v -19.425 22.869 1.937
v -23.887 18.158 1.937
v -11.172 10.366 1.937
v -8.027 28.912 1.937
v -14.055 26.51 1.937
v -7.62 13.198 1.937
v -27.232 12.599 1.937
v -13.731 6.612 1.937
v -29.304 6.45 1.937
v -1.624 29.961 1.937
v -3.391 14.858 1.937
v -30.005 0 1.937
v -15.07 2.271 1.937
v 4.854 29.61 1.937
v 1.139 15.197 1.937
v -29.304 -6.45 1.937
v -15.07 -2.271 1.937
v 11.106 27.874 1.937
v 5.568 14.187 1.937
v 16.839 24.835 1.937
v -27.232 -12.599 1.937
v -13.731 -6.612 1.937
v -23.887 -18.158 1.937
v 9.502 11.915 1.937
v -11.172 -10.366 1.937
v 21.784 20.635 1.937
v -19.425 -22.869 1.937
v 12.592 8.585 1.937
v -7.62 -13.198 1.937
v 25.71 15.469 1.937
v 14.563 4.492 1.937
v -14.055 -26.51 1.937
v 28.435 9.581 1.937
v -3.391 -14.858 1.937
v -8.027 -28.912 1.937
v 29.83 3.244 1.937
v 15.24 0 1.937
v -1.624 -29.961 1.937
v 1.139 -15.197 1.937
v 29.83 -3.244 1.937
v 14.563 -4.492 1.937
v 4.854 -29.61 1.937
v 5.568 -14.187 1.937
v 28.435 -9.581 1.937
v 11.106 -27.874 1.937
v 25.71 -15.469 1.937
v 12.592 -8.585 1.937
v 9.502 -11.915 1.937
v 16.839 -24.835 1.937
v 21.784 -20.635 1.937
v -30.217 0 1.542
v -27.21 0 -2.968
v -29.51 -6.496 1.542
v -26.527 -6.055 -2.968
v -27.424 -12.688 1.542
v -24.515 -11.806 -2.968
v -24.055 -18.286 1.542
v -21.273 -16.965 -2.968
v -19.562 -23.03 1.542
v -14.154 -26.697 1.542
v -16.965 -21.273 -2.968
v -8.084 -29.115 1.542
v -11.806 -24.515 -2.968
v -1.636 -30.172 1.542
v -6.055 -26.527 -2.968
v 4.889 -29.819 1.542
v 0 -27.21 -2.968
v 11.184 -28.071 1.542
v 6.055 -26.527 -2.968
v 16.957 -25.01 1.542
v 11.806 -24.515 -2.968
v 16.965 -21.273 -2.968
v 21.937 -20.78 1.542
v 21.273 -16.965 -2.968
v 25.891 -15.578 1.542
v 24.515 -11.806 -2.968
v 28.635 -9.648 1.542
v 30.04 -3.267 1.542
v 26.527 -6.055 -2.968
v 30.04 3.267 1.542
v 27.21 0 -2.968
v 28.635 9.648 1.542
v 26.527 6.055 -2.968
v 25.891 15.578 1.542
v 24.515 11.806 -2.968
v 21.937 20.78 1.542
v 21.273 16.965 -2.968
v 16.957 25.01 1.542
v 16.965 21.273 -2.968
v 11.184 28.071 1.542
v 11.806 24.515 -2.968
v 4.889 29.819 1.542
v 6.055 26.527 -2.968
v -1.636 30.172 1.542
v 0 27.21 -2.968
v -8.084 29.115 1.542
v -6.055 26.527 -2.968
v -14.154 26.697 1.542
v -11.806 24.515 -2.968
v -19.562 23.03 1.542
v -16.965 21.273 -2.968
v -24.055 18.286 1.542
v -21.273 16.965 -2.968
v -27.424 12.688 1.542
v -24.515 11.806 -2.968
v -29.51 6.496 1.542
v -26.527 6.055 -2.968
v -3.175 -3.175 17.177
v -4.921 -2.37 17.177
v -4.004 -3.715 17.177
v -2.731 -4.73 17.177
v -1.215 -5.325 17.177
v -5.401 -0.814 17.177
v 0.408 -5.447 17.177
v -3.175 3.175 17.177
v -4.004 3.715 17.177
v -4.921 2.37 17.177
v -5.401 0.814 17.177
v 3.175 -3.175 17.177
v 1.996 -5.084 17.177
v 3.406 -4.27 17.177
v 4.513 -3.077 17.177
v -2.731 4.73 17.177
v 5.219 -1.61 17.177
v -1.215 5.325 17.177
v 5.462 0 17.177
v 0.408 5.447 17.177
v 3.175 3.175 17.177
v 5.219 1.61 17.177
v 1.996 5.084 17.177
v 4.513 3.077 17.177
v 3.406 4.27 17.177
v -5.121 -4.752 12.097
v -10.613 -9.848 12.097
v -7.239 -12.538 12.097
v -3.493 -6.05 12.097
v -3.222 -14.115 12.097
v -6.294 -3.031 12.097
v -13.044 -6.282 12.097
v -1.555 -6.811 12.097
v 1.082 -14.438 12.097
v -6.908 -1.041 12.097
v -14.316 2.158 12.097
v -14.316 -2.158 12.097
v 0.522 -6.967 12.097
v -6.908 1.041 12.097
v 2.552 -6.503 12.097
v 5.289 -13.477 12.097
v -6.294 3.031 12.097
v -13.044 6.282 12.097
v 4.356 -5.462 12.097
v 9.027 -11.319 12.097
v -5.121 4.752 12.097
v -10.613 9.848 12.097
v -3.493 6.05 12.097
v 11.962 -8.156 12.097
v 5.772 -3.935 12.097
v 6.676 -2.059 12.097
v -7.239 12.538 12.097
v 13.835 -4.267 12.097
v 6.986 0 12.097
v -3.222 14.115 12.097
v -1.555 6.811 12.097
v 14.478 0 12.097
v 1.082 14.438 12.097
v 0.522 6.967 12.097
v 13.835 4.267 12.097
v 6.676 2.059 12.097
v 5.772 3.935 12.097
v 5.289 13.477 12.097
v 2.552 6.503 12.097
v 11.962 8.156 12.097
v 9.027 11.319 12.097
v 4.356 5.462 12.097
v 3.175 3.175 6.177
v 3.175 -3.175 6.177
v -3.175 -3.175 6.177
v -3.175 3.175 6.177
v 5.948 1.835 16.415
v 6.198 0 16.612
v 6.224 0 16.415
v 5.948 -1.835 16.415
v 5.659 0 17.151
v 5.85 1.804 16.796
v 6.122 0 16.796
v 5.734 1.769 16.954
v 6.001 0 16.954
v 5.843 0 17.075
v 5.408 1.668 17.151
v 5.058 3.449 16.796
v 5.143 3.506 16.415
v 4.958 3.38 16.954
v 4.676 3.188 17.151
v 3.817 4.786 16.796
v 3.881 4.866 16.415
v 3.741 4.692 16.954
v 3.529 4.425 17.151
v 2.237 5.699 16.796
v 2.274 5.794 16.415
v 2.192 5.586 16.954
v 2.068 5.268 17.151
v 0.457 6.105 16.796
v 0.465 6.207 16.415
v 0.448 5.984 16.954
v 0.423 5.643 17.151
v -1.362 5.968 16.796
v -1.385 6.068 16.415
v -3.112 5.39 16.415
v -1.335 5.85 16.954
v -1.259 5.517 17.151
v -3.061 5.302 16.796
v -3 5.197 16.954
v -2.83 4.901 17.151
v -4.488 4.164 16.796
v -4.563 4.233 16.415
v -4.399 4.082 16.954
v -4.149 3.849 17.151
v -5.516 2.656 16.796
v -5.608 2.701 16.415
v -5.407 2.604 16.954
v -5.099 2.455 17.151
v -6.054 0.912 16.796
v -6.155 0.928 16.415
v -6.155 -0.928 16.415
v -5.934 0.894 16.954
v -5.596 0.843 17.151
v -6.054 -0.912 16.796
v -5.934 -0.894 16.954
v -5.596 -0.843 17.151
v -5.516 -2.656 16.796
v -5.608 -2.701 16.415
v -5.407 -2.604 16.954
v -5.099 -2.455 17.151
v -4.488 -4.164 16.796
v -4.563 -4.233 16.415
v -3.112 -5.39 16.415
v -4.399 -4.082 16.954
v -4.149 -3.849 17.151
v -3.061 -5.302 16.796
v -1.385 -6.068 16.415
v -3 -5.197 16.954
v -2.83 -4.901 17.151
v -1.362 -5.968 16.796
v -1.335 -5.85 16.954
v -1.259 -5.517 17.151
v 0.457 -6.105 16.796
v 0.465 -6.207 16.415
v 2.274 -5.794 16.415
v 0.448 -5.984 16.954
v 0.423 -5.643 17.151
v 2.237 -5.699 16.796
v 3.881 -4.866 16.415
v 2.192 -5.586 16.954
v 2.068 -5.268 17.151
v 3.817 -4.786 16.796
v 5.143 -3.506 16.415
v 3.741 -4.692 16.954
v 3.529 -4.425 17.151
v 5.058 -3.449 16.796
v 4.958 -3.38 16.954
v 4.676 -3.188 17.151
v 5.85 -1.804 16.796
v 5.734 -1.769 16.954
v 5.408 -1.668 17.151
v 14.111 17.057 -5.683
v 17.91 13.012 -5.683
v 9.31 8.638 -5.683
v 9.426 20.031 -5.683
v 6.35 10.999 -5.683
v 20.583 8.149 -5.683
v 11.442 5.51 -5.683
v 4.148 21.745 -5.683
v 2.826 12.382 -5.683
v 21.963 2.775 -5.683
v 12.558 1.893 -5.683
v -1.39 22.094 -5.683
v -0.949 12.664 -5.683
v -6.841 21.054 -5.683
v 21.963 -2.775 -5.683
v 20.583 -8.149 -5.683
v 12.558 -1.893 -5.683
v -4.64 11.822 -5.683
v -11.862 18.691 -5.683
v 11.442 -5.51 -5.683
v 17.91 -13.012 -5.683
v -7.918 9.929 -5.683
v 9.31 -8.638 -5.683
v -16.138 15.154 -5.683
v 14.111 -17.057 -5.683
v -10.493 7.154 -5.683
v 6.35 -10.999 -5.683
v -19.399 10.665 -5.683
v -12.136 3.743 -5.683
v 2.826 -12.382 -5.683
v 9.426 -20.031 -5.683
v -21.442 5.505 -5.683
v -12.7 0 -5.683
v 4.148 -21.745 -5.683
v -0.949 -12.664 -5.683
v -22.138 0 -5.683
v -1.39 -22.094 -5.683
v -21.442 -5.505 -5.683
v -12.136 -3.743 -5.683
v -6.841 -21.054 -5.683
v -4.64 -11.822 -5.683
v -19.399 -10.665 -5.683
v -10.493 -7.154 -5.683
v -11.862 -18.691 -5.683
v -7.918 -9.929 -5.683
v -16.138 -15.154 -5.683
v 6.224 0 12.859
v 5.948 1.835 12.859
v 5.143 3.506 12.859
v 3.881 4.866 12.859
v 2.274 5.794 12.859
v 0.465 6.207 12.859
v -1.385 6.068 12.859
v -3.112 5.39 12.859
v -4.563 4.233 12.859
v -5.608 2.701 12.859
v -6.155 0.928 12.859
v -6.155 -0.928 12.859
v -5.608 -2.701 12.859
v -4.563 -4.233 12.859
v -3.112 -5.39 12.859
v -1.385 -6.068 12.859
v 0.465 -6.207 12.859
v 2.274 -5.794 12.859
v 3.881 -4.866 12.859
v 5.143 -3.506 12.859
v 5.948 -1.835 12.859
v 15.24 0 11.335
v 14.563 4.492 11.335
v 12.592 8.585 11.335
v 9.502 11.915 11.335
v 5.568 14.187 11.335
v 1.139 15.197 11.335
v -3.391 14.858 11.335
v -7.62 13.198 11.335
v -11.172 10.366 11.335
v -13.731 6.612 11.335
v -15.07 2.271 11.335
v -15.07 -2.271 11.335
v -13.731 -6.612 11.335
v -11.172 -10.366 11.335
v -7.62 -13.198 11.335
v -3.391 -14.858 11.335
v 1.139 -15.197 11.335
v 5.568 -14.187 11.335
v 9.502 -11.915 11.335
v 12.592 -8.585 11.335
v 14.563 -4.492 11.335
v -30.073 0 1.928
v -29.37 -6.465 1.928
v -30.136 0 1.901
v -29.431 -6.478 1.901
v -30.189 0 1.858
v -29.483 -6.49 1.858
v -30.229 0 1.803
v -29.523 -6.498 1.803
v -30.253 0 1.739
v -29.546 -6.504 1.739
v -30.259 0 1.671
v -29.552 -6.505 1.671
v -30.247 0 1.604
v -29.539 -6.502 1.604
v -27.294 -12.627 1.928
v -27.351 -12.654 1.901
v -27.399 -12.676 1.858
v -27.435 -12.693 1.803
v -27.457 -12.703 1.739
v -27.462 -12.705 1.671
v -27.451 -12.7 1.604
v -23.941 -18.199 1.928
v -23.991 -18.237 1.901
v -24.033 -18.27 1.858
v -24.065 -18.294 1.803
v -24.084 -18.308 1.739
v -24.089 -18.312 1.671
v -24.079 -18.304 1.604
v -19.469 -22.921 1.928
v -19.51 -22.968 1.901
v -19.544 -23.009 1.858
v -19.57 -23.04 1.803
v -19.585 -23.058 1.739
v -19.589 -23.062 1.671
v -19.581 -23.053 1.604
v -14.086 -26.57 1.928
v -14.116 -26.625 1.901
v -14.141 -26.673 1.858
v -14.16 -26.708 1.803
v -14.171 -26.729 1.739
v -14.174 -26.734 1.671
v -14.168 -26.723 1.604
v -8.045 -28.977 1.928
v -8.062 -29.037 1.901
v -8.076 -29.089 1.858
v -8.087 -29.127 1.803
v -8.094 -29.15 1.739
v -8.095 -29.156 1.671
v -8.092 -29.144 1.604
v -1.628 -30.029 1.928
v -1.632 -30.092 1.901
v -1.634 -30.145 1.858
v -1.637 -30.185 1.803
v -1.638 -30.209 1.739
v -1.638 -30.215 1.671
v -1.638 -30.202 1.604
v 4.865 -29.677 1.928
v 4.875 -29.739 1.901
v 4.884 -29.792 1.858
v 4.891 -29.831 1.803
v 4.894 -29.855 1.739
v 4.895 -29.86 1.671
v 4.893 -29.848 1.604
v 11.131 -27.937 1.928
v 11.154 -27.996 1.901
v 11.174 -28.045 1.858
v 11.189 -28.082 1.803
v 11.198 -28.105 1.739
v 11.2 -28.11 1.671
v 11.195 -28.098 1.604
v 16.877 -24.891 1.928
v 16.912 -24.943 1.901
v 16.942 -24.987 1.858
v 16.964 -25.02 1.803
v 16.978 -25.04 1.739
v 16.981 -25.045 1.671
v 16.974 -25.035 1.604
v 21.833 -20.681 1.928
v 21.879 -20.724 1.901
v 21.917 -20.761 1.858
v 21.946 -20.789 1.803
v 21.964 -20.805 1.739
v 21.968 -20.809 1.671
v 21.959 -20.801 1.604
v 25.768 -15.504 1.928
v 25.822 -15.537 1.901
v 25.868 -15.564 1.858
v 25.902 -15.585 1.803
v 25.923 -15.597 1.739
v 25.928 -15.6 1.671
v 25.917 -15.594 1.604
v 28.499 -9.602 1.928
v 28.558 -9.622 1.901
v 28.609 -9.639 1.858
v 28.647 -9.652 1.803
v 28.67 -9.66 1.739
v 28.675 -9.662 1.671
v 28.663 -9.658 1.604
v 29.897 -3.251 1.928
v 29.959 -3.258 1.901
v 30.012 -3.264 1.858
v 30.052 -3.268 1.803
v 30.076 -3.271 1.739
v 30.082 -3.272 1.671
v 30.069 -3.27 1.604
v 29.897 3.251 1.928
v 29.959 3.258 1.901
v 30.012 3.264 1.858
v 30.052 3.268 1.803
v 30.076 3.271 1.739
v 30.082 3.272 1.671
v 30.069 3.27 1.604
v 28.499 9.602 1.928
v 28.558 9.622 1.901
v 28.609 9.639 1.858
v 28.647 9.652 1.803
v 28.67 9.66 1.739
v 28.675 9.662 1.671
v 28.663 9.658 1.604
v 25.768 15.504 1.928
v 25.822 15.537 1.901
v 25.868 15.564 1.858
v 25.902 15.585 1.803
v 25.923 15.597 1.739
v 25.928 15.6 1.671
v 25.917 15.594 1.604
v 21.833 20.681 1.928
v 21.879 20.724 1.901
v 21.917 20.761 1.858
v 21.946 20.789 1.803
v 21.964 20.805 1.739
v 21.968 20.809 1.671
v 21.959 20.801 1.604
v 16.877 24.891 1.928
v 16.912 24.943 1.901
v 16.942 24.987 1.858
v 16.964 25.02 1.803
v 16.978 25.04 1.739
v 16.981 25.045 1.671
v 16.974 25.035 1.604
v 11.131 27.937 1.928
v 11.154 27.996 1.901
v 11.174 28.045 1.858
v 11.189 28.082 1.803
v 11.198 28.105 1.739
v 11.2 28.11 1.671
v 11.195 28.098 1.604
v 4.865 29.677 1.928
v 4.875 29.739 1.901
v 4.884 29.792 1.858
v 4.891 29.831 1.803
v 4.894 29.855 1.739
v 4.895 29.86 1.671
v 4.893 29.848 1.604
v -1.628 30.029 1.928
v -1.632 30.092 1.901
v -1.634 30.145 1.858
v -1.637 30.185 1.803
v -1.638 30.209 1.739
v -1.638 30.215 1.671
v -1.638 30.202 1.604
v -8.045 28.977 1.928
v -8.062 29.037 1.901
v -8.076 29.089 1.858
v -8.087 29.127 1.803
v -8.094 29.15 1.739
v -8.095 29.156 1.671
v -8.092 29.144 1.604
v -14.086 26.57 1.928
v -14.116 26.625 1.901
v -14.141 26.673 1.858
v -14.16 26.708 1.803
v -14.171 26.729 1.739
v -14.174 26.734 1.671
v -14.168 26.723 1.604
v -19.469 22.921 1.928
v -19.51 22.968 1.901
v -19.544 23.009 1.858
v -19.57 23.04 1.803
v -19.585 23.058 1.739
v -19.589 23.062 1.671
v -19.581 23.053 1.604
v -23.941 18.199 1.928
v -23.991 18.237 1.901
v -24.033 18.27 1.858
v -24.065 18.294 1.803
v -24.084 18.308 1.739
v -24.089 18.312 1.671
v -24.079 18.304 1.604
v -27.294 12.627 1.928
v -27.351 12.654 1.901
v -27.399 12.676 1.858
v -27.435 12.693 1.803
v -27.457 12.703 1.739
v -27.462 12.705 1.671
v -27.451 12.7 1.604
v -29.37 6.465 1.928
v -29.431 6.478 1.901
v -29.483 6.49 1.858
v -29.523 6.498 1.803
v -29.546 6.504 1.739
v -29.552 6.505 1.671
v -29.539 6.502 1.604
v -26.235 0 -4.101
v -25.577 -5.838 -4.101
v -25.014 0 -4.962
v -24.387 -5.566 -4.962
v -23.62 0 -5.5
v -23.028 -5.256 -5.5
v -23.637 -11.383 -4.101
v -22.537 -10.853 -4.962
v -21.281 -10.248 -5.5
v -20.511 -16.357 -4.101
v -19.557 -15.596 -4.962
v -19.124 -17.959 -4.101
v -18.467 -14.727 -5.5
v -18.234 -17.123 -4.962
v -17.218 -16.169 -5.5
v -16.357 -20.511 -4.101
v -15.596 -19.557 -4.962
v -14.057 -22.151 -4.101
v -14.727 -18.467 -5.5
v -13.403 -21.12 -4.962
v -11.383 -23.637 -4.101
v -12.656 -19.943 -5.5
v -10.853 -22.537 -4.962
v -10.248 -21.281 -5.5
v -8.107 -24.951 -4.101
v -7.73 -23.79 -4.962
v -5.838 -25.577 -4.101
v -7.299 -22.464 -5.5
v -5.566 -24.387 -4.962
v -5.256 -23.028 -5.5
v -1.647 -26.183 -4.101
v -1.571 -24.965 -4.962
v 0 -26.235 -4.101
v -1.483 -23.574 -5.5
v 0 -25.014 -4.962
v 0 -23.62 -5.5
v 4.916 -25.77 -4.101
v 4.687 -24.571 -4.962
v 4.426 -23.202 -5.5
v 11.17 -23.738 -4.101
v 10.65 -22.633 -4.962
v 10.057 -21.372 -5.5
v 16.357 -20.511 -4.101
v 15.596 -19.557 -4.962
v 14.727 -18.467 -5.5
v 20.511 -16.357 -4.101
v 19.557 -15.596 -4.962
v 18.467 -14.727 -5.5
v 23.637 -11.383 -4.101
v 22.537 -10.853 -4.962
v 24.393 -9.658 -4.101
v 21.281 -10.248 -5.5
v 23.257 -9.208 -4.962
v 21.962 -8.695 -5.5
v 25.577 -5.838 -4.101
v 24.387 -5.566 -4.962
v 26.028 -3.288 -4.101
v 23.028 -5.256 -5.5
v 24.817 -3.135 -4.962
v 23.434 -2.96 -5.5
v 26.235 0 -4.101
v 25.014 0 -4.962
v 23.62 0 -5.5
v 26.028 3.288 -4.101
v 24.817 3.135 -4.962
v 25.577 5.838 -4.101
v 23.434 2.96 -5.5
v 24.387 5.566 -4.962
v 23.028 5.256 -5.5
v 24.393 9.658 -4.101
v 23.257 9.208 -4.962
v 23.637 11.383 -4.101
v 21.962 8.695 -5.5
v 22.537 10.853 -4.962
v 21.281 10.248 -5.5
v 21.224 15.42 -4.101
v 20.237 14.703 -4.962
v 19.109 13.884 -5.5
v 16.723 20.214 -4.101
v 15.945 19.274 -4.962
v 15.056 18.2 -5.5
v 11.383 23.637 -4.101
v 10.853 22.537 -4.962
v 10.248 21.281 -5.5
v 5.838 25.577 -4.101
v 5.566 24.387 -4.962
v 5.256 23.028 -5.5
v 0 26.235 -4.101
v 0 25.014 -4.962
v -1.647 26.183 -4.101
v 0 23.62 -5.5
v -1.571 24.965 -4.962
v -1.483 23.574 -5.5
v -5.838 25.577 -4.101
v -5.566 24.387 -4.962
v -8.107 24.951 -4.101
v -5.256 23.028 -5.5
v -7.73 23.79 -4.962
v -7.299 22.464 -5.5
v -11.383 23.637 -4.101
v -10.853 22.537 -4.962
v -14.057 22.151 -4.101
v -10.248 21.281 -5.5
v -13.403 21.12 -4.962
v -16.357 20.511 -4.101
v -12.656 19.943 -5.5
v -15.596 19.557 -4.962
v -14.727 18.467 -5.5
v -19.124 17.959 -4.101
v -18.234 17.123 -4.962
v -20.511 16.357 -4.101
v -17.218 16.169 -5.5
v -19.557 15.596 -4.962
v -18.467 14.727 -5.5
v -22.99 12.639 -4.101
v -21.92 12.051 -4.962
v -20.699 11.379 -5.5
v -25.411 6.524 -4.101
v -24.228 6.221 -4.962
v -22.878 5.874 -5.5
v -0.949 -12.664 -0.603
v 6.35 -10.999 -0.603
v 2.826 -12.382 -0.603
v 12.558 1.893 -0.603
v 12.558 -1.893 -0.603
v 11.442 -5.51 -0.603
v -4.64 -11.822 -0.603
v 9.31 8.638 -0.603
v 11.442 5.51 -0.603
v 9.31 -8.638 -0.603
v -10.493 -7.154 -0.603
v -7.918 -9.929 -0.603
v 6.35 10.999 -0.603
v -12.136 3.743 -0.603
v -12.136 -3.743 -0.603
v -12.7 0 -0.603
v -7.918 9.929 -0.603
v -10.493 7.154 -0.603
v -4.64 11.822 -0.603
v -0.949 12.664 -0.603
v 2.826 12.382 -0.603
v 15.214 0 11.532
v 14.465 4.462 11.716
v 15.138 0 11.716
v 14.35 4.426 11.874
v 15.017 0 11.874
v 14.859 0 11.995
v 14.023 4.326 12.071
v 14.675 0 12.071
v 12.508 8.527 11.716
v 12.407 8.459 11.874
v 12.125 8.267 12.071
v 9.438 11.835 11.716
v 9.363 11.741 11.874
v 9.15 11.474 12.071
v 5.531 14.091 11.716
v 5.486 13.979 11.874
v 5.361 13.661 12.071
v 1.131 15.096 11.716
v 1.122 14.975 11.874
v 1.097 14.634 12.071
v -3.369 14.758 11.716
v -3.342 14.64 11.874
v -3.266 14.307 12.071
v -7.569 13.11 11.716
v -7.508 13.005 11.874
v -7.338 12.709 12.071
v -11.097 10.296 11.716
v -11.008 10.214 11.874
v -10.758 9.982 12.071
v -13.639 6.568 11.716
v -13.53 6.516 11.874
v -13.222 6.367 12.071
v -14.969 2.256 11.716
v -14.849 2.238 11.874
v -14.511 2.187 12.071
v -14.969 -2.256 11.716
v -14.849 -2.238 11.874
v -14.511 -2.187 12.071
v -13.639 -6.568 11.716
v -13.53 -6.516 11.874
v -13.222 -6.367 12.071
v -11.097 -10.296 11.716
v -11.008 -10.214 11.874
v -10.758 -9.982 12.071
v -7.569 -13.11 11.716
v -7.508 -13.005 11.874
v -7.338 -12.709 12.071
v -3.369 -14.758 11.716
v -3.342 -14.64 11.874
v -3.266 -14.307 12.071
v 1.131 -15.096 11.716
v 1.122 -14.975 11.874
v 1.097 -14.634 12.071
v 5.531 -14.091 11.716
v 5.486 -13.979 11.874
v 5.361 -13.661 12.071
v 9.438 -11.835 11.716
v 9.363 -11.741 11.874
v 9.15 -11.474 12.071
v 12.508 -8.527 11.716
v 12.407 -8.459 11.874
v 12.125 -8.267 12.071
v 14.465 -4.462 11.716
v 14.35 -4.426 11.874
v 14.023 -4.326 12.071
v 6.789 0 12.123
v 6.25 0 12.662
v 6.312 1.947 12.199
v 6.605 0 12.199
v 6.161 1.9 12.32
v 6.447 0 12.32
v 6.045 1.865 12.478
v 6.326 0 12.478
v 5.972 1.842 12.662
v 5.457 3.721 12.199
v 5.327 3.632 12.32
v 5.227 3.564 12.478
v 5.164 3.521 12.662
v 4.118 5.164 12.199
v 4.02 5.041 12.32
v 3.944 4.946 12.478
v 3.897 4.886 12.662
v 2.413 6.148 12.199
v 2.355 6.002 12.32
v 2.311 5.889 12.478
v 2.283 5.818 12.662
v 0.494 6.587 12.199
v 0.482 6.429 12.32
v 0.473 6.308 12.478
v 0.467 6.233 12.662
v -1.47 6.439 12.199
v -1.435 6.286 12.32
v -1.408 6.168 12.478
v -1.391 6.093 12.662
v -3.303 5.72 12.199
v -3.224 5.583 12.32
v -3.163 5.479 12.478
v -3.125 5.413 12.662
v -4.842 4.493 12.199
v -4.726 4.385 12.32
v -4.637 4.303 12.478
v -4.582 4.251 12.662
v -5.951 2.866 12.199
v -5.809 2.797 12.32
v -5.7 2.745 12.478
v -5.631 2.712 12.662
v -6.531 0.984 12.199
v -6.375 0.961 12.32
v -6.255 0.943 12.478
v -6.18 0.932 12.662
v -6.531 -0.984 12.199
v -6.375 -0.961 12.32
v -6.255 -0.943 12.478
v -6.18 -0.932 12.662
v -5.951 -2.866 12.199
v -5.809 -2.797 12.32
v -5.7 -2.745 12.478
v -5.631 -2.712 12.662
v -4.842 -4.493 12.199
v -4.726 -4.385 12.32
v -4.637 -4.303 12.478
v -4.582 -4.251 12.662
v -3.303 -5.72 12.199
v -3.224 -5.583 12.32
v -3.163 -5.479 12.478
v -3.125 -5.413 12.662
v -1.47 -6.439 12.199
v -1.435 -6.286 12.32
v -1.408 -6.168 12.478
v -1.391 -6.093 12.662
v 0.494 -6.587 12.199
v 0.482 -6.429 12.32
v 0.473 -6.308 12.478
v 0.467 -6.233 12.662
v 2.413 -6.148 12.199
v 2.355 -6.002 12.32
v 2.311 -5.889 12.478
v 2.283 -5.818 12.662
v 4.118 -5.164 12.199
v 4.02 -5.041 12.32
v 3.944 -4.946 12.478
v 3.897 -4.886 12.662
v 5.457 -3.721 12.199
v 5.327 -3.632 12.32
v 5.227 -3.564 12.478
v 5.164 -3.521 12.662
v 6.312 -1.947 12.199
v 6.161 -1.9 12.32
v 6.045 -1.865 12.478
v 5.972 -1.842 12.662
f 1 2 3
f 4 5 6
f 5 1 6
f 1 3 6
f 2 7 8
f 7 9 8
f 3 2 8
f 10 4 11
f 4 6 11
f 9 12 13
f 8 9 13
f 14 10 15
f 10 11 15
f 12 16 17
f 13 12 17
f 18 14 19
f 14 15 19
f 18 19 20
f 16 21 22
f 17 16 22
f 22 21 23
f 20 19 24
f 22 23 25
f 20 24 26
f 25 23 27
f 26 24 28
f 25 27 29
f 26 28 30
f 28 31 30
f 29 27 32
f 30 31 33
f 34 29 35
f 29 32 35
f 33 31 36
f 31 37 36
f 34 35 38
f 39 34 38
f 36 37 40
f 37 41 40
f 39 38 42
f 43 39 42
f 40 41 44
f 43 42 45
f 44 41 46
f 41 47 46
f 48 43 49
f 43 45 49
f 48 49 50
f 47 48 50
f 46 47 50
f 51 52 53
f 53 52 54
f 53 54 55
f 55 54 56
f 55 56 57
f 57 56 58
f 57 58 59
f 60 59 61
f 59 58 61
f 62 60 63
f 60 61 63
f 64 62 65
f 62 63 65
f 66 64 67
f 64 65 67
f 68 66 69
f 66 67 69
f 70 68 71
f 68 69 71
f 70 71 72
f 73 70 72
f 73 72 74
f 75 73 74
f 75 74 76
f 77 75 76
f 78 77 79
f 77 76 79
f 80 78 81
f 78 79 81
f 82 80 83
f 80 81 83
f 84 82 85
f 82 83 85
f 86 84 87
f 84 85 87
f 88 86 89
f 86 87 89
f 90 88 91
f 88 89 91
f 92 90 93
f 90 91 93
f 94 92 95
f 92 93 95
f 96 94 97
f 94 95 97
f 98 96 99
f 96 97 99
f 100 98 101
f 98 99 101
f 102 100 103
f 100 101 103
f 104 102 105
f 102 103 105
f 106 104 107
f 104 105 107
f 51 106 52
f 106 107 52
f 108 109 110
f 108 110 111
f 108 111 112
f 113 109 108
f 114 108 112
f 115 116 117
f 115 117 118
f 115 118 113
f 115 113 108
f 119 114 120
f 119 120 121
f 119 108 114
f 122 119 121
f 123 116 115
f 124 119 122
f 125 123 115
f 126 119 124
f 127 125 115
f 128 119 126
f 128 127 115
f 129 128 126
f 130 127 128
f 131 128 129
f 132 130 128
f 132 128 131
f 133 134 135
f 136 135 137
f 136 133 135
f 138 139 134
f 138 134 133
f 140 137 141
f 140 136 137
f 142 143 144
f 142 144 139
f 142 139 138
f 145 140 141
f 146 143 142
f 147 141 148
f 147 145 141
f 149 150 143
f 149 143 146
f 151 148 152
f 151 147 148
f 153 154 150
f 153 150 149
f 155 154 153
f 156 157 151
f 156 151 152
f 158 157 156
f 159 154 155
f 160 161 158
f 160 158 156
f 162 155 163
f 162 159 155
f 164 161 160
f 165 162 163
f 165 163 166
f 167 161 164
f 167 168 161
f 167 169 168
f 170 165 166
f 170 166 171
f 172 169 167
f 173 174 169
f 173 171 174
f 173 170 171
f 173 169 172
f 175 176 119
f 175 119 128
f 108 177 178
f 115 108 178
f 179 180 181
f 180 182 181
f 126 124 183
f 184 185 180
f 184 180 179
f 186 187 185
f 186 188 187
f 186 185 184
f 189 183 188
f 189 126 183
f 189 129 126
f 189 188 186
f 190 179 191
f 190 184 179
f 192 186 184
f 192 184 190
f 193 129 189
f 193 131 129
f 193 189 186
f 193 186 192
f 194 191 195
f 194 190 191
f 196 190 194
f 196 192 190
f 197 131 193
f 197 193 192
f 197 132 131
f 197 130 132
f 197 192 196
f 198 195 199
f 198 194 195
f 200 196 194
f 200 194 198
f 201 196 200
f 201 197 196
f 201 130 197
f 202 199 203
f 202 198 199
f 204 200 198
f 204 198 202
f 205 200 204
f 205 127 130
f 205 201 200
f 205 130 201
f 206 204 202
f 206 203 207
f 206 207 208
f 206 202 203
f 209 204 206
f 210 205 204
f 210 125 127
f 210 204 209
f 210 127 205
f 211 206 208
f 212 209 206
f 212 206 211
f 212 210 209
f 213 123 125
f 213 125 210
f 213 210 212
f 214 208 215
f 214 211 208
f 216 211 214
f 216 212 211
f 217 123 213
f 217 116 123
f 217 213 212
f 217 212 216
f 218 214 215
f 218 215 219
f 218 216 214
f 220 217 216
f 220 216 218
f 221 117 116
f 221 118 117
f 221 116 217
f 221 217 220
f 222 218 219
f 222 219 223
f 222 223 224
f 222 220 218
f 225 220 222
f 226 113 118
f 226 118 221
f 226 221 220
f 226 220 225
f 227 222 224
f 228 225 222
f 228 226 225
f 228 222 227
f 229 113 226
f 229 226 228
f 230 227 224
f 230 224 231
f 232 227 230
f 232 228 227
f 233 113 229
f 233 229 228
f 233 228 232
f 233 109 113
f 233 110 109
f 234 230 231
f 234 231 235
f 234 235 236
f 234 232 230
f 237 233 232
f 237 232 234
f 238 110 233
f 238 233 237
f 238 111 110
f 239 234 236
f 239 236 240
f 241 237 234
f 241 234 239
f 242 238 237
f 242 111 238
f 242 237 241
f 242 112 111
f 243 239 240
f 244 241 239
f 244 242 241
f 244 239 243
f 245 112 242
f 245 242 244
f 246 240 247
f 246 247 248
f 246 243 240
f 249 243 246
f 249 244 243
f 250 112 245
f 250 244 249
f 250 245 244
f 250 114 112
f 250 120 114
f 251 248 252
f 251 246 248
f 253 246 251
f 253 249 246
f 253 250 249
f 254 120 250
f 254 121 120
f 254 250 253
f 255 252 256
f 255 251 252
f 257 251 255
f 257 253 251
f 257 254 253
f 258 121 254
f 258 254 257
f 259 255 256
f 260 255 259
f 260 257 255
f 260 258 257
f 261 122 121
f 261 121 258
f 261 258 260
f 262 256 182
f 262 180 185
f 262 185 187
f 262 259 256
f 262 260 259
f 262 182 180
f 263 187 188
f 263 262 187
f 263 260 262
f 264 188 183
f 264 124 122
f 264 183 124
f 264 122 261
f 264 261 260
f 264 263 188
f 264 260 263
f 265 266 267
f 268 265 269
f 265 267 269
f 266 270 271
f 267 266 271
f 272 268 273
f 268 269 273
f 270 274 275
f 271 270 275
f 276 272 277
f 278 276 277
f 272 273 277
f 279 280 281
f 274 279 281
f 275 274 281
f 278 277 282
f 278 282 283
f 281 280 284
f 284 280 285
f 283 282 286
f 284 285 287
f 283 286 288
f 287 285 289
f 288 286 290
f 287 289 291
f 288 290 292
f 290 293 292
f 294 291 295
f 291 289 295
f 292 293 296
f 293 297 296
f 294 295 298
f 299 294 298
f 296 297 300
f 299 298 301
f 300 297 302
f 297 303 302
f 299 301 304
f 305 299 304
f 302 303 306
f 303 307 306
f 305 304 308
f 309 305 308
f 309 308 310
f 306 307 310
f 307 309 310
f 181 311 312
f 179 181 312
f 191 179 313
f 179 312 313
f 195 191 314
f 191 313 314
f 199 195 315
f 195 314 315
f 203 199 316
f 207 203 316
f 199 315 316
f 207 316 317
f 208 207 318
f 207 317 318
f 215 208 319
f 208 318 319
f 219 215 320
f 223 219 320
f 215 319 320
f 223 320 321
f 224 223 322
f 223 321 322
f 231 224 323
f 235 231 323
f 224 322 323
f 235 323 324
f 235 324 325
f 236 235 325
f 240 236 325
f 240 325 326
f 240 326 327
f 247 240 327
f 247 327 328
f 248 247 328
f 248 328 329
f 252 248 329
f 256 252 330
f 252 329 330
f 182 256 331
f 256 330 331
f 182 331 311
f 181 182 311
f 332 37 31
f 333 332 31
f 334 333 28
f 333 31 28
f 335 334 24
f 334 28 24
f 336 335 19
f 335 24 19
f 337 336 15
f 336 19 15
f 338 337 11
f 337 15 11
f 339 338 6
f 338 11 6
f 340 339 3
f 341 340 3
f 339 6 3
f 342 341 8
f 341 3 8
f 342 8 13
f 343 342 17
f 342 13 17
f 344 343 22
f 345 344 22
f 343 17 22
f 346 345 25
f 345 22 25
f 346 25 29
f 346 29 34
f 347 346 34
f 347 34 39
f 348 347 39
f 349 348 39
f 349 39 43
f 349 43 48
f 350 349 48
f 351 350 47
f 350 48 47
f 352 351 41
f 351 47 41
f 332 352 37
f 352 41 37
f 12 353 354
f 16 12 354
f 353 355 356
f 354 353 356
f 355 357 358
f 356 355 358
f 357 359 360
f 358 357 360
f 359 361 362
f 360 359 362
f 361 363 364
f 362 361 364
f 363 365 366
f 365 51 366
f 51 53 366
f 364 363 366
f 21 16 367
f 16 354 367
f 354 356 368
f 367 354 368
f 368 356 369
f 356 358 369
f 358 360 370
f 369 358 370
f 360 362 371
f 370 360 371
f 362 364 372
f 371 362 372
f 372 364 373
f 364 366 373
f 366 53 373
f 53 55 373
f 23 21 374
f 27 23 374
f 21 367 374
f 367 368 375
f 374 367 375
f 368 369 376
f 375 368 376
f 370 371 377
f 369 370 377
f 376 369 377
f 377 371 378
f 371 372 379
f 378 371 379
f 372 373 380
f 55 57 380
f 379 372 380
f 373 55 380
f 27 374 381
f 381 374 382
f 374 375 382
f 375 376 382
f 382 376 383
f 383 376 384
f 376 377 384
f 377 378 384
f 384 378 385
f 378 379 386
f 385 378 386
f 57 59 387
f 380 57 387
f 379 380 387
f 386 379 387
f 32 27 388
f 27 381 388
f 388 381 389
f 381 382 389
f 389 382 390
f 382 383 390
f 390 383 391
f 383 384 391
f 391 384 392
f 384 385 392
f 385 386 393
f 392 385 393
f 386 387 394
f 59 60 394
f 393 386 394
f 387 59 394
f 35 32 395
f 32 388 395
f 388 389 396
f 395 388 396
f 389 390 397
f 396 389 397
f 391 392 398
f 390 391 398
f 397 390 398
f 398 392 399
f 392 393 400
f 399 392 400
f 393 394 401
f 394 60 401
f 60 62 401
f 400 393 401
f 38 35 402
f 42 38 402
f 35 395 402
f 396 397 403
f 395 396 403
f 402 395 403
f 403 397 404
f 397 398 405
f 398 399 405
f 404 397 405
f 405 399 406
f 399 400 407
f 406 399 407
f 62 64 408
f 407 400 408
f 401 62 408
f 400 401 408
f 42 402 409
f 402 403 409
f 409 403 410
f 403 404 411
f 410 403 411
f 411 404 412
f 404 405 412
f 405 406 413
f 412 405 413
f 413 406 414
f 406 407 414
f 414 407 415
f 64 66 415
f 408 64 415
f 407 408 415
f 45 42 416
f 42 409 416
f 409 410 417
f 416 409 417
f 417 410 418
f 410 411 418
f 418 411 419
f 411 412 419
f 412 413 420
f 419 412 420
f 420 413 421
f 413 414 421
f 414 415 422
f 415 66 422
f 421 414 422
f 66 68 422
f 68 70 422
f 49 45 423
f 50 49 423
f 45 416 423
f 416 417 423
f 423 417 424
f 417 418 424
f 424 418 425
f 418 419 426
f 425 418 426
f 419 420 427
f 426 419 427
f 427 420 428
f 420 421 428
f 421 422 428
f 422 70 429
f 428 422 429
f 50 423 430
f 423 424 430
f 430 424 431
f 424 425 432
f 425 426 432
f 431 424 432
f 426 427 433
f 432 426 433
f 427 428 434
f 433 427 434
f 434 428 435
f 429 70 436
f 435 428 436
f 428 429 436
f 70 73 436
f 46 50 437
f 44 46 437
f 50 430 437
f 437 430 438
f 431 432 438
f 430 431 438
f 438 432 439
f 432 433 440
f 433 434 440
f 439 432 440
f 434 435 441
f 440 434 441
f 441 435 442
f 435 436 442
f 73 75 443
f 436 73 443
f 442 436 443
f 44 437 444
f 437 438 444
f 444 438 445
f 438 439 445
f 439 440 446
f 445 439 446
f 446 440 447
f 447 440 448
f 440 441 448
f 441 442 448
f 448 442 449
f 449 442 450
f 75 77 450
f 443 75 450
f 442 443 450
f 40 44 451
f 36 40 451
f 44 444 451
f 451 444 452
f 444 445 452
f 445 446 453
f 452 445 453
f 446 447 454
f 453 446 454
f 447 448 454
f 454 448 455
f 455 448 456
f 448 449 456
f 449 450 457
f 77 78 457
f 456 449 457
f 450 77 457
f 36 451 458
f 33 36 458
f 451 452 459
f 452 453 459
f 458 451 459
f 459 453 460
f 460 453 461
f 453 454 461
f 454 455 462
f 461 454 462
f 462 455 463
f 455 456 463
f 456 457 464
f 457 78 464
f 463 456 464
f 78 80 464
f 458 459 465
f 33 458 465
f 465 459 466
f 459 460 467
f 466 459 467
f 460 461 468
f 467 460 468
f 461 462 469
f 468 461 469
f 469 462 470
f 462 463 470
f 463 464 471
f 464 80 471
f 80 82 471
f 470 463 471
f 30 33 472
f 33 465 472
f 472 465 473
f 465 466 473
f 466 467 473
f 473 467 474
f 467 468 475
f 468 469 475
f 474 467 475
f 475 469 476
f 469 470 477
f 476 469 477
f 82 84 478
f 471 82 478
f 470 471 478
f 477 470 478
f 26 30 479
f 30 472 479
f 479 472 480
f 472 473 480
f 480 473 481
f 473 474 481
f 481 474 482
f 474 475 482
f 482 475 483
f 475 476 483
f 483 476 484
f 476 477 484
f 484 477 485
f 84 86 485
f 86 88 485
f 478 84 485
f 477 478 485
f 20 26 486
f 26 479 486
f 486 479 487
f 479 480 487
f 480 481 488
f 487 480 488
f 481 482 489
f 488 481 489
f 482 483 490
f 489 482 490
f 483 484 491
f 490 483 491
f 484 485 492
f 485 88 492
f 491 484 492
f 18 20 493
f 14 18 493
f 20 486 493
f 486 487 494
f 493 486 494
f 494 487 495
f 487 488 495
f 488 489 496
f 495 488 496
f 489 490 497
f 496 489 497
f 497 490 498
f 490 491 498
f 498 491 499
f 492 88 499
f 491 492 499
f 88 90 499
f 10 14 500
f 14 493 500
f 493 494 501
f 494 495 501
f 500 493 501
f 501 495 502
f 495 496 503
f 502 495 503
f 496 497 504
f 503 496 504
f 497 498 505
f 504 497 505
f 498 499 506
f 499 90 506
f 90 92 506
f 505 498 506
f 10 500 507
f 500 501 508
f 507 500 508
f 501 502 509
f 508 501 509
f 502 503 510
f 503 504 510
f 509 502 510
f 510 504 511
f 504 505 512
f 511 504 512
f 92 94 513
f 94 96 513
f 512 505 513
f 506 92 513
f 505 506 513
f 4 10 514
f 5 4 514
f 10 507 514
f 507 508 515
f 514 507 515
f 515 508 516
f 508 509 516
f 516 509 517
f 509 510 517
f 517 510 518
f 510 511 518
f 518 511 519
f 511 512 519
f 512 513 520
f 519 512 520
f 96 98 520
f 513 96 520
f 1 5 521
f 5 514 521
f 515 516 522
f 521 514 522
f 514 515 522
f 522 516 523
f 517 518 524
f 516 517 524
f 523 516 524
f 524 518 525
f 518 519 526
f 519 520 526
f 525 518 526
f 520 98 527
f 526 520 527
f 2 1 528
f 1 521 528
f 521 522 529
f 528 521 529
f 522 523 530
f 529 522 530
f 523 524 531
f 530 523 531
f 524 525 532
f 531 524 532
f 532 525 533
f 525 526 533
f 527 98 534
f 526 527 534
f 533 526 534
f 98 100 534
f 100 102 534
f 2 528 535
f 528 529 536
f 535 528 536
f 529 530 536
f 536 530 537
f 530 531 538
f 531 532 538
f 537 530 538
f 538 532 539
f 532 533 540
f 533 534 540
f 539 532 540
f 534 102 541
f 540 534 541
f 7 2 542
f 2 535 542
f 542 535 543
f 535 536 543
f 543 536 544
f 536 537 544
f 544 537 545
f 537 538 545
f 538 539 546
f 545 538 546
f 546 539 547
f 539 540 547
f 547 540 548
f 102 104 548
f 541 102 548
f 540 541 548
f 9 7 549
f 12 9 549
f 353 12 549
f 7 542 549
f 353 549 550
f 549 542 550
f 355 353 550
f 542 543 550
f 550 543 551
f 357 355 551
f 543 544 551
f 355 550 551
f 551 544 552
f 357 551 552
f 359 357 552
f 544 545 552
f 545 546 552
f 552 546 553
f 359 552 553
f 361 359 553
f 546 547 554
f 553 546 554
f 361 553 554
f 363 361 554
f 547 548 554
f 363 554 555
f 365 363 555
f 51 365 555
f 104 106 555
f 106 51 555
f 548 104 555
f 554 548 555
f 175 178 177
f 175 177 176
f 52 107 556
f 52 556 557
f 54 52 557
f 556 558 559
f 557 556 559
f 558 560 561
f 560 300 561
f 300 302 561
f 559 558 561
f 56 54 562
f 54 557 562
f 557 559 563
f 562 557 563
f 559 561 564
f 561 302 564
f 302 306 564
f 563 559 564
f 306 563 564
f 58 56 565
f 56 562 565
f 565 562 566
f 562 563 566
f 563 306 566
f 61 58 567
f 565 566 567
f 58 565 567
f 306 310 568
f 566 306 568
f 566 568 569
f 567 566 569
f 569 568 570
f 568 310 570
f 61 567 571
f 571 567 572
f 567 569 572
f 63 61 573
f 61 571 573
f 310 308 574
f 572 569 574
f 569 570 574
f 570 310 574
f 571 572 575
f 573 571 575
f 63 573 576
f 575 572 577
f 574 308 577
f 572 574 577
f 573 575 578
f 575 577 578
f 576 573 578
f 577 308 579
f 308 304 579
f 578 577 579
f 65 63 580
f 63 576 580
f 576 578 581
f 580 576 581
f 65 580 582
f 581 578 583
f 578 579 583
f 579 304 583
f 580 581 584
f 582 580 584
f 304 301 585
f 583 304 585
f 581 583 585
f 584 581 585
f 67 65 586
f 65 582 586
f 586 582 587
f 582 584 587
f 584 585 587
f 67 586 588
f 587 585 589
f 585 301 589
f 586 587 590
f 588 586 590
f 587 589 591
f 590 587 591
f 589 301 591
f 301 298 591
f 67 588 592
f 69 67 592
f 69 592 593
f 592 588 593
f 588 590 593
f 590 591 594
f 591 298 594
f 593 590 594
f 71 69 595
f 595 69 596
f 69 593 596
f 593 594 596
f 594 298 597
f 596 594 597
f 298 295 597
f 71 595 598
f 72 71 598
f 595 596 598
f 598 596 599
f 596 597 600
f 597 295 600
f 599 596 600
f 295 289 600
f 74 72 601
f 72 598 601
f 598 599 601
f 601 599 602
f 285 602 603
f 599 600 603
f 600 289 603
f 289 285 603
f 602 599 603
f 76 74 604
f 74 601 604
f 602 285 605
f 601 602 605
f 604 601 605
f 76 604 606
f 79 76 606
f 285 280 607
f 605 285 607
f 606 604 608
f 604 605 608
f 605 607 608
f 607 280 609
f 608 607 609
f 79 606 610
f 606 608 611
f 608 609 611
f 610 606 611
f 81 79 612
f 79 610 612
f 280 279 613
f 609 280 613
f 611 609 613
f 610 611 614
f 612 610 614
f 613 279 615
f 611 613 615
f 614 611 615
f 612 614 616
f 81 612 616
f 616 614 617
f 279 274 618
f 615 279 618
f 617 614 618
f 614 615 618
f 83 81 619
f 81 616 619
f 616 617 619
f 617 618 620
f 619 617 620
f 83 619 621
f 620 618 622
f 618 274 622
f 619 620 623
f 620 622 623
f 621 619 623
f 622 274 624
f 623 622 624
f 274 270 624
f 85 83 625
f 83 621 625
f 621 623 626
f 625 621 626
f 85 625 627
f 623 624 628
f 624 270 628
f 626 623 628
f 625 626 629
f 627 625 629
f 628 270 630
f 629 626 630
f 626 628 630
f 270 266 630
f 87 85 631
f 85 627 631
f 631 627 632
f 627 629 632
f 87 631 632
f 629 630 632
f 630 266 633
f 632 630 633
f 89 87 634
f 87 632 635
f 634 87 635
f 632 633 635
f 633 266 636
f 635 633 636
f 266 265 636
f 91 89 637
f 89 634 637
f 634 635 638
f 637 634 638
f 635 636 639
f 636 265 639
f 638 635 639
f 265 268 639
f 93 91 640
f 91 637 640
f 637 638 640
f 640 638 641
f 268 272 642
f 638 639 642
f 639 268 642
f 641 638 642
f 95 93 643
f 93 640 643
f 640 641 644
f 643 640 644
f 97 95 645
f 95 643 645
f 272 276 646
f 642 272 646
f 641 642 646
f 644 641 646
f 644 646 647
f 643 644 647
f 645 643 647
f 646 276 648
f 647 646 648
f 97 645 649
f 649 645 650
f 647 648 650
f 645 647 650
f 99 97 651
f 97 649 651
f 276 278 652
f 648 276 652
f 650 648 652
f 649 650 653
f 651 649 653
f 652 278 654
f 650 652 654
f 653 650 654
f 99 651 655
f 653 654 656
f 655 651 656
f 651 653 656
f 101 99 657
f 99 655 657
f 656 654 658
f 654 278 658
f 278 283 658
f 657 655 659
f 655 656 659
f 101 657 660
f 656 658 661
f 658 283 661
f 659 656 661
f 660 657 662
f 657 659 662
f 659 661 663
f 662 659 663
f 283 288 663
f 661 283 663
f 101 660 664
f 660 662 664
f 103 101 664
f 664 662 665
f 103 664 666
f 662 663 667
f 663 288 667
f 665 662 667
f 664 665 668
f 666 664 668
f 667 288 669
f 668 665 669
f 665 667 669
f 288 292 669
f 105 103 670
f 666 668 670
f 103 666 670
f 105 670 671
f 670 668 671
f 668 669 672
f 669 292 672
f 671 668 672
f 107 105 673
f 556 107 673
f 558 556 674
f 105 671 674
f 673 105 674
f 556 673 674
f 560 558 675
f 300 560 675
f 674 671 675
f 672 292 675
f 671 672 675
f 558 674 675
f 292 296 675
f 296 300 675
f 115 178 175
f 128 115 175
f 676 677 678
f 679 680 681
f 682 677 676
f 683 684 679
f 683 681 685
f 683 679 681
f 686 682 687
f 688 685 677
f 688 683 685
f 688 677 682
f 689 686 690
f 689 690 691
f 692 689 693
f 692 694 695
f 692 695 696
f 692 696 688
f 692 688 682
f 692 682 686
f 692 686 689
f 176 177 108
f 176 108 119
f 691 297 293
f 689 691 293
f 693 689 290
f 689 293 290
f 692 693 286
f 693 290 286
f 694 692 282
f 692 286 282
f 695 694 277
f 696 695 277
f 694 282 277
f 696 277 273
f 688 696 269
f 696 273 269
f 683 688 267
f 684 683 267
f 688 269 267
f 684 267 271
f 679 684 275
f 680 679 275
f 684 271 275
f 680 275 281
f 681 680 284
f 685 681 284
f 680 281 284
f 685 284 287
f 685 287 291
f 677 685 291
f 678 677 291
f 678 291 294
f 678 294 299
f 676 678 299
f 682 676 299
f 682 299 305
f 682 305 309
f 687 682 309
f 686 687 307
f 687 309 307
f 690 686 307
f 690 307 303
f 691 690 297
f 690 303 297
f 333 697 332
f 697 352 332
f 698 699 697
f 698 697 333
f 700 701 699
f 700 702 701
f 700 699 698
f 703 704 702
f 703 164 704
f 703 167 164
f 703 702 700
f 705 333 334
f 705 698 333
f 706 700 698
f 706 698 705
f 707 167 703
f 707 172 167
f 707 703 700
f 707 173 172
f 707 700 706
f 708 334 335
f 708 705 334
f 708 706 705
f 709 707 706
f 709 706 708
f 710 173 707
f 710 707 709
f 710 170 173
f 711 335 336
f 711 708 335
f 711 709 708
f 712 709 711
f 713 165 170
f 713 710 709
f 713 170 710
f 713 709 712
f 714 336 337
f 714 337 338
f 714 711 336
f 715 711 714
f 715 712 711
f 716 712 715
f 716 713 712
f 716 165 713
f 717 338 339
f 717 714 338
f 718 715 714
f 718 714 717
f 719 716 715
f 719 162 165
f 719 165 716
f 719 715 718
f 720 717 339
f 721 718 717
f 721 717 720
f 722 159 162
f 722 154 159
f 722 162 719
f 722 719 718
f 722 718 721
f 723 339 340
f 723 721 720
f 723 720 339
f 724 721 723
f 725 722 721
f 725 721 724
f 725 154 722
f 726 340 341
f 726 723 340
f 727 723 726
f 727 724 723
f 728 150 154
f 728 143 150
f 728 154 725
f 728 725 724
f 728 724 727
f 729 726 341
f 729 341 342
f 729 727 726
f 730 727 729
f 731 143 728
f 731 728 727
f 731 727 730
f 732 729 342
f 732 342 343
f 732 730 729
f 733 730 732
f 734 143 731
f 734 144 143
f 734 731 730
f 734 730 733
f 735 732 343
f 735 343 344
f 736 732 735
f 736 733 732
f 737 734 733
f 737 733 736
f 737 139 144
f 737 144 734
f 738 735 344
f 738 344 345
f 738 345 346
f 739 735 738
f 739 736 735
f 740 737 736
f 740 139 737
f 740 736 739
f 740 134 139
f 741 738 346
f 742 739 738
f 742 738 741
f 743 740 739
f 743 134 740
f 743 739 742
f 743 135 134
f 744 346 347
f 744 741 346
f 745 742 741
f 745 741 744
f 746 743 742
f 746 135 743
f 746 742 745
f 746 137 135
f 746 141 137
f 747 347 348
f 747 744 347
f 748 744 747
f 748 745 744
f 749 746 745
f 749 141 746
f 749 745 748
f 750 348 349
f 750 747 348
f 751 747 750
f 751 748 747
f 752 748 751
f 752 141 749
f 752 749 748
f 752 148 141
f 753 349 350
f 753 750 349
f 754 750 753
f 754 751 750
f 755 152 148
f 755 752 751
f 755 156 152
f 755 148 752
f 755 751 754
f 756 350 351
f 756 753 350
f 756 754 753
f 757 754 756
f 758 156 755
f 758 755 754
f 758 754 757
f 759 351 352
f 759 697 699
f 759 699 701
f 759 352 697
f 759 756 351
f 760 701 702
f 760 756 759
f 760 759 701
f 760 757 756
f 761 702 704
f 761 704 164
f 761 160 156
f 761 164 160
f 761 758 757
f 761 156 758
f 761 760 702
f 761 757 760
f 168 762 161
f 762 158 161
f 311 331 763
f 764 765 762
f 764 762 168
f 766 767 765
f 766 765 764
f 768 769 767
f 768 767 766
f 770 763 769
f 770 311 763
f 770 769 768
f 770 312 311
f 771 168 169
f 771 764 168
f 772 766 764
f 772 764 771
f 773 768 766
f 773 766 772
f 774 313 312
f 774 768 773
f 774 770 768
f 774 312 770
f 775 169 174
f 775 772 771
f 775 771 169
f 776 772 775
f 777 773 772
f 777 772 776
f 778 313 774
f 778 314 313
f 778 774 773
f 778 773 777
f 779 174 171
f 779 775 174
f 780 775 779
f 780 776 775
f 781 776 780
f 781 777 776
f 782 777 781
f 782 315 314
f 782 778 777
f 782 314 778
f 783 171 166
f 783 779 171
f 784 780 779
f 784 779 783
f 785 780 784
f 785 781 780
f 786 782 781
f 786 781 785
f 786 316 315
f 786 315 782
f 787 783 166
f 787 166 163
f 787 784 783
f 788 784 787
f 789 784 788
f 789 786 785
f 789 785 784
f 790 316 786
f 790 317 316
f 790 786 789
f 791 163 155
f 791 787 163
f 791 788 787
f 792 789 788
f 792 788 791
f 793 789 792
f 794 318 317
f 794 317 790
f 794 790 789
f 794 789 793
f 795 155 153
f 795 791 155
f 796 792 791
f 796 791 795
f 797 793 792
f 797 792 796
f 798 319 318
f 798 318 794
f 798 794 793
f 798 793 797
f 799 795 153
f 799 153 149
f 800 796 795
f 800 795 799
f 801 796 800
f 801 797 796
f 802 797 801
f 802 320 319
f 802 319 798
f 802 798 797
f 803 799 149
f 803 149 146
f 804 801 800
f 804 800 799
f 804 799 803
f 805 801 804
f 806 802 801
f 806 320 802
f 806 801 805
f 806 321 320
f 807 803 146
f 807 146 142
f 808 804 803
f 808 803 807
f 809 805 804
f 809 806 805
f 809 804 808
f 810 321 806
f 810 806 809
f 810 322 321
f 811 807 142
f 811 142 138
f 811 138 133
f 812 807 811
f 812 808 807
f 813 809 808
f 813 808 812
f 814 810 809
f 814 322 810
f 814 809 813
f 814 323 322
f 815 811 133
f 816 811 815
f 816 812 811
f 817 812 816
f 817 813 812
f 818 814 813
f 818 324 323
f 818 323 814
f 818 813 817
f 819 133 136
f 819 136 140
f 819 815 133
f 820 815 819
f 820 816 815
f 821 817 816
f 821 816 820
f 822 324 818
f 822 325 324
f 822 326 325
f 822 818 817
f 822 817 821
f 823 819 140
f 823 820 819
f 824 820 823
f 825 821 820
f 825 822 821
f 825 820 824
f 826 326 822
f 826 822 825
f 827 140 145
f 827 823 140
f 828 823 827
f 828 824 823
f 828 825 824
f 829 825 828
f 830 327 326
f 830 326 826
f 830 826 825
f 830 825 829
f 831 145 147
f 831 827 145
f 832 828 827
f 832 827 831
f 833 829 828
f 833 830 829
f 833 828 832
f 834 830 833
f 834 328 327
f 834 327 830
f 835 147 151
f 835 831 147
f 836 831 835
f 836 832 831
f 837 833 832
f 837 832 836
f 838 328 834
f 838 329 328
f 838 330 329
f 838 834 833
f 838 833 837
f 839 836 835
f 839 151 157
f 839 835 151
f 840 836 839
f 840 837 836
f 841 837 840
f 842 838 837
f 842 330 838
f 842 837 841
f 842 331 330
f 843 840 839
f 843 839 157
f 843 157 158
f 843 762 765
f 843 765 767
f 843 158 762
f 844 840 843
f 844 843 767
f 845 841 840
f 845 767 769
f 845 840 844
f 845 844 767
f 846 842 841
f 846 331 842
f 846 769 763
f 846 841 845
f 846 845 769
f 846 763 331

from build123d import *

# Parameters (mm, degrees)
SKETCH3_R           = 15.24
BOSS_EXTRUDE2_DEPTH = 10.16
SKETCH4_R           = 6.224057783
BOSS_EXTRUDE3_DEPTH = 5.08
SKETCH5_R           = 12.7
CUT_EXTRUDE1_DEPTH  = 5.08
FILLET1_R           = 6.096
FILLET2_R           = 0.762
FILLET3_R           = 0.254
SKETCH6_W           = 6.35
SKETCH6_H           = 6.35
CUT_EXTRUDE2_DEPTH  = 11


with BuildPart() as part:
    # Sketch1 → Revolve1 (revolve)
    with BuildSketch(Plane(origin=(0, 0, 0), x_dir=(1, 0, 0), z_dir=(0, 1, 0)), mode=Mode.PRIVATE) as revolve1_sk:
        Polygon((0, 5.683021583), (0, -1.936978417), (30.48, -1.936978417), (25.4, 5.683021583), align=None)
    revolve(revolve1_sk.sketch.rotate(Axis((0, 0, -5.683021583), (0, 0, 1)), 180), axis=Axis((0, 0, -5.683021583), (0, 0, 1)))

    # Sketch3 → Boss-Extrude2 (add)
    with BuildSketch(Plane.XY.offset(1.936978417)):
        Circle(SKETCH3_R)
    extrude(amount=BOSS_EXTRUDE2_DEPTH)

    # Sketch4 → Boss-Extrude3 (add)
    with BuildSketch(Plane.XY.offset(12.096978417)):
        Circle(SKETCH4_R)
    extrude(amount=BOSS_EXTRUDE3_DEPTH)

    # Sketch5 → Cut-Extrude1 (cut)
    with BuildSketch(Plane(origin=(0, 0, -5.683021583), x_dir=(-1, 0, 0), z_dir=(0, 0, -1))):
        Circle(SKETCH5_R)
    extrude(amount=-CUT_EXTRUDE1_DEPTH, mode=Mode.SUBTRACT)

    # Fillet1
    fillet1_edges = [part.edges().sort_by_distance(p)[0] for p in [
        (25.4, 0, -5.683021583),
    ]]
    fillet(fillet1_edges, radius=FILLET1_R)

    # Fillet2
    fillet2_edges = [part.edges().sort_by_distance(p)[0] for p in [
        (-15.24, 0, 12.096978417),
        (-6.224057783, 0, 12.096978417),
        (-6.224057783, 0, 17.176978417),
    ]]
    fillet(fillet2_edges, radius=FILLET2_R)

    # Fillet3
    fillet3_edges = [part.edges().sort_by_distance(p)[0] for p in [
        (30.48, 0, 1.936978417),
    ]]
    fillet(fillet3_edges, radius=FILLET3_R)

    # Sketch6 → Cut-Extrude2 (cut)
    with BuildSketch(Plane.XY.offset(17.176978417)):
        Rectangle(SKETCH6_W, SKETCH6_H)
    extrude(amount=-CUT_EXTRUDE2_DEPTH, mode=Mode.SUBTRACT)


solid = part.part
